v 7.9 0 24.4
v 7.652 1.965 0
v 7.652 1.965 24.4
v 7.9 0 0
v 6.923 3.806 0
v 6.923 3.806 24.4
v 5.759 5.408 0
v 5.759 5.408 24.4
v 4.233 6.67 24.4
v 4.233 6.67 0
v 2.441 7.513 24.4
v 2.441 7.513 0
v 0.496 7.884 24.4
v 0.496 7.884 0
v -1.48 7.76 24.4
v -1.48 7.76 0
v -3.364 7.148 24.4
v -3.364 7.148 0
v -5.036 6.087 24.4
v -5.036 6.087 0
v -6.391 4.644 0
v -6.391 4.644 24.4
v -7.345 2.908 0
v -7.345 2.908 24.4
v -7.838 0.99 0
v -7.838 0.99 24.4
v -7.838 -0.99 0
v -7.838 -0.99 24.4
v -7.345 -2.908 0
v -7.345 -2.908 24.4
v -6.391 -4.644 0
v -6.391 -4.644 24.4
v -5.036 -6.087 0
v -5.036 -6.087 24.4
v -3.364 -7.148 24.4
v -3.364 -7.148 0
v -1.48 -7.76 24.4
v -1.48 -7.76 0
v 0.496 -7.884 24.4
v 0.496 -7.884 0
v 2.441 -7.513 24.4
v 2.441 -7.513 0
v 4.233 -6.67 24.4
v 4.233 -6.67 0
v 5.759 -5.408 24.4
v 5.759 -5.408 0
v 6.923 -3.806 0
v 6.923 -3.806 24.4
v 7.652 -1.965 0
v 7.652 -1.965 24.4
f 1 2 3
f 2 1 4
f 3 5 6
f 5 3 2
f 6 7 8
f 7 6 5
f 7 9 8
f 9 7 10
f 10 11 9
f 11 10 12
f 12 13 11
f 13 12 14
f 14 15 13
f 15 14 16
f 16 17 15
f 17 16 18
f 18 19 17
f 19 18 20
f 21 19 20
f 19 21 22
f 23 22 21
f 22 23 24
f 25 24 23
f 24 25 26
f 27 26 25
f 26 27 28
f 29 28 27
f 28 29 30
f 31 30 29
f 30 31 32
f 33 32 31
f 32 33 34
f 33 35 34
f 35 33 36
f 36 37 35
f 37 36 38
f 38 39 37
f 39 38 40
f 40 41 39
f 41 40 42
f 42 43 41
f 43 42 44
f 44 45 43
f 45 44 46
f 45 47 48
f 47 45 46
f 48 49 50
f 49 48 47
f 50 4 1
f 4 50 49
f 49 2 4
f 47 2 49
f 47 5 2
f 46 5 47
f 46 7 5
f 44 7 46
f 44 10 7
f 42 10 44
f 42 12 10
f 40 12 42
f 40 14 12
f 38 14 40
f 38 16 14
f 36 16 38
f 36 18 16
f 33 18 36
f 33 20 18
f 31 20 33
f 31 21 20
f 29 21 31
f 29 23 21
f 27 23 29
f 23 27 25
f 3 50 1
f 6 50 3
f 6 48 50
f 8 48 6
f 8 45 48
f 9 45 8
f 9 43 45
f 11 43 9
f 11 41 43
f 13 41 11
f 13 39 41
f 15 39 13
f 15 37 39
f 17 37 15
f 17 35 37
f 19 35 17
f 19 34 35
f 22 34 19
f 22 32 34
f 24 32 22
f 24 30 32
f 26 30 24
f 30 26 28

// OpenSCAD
function LM8UULinearBearingDiam() = 15;
function LM8UULinearBearingInnerDiam() = 8.3;
function LM8UULinearBearingHeight() = 24;
function LM8UULinearBearingRidgeOffset()= 4.6;

module LM8UUBearing(3dPrinterTolerance=.4)
{
cylinder(LM8UULinearBearingHeight()+3dPrinterTolerance, LM8UULinearBearingDiam()/2+3dPrinterTolerance, LM8UULinearBearingDiam()/2+3dPrinterTolerance);
}


LM8UUBearing();
